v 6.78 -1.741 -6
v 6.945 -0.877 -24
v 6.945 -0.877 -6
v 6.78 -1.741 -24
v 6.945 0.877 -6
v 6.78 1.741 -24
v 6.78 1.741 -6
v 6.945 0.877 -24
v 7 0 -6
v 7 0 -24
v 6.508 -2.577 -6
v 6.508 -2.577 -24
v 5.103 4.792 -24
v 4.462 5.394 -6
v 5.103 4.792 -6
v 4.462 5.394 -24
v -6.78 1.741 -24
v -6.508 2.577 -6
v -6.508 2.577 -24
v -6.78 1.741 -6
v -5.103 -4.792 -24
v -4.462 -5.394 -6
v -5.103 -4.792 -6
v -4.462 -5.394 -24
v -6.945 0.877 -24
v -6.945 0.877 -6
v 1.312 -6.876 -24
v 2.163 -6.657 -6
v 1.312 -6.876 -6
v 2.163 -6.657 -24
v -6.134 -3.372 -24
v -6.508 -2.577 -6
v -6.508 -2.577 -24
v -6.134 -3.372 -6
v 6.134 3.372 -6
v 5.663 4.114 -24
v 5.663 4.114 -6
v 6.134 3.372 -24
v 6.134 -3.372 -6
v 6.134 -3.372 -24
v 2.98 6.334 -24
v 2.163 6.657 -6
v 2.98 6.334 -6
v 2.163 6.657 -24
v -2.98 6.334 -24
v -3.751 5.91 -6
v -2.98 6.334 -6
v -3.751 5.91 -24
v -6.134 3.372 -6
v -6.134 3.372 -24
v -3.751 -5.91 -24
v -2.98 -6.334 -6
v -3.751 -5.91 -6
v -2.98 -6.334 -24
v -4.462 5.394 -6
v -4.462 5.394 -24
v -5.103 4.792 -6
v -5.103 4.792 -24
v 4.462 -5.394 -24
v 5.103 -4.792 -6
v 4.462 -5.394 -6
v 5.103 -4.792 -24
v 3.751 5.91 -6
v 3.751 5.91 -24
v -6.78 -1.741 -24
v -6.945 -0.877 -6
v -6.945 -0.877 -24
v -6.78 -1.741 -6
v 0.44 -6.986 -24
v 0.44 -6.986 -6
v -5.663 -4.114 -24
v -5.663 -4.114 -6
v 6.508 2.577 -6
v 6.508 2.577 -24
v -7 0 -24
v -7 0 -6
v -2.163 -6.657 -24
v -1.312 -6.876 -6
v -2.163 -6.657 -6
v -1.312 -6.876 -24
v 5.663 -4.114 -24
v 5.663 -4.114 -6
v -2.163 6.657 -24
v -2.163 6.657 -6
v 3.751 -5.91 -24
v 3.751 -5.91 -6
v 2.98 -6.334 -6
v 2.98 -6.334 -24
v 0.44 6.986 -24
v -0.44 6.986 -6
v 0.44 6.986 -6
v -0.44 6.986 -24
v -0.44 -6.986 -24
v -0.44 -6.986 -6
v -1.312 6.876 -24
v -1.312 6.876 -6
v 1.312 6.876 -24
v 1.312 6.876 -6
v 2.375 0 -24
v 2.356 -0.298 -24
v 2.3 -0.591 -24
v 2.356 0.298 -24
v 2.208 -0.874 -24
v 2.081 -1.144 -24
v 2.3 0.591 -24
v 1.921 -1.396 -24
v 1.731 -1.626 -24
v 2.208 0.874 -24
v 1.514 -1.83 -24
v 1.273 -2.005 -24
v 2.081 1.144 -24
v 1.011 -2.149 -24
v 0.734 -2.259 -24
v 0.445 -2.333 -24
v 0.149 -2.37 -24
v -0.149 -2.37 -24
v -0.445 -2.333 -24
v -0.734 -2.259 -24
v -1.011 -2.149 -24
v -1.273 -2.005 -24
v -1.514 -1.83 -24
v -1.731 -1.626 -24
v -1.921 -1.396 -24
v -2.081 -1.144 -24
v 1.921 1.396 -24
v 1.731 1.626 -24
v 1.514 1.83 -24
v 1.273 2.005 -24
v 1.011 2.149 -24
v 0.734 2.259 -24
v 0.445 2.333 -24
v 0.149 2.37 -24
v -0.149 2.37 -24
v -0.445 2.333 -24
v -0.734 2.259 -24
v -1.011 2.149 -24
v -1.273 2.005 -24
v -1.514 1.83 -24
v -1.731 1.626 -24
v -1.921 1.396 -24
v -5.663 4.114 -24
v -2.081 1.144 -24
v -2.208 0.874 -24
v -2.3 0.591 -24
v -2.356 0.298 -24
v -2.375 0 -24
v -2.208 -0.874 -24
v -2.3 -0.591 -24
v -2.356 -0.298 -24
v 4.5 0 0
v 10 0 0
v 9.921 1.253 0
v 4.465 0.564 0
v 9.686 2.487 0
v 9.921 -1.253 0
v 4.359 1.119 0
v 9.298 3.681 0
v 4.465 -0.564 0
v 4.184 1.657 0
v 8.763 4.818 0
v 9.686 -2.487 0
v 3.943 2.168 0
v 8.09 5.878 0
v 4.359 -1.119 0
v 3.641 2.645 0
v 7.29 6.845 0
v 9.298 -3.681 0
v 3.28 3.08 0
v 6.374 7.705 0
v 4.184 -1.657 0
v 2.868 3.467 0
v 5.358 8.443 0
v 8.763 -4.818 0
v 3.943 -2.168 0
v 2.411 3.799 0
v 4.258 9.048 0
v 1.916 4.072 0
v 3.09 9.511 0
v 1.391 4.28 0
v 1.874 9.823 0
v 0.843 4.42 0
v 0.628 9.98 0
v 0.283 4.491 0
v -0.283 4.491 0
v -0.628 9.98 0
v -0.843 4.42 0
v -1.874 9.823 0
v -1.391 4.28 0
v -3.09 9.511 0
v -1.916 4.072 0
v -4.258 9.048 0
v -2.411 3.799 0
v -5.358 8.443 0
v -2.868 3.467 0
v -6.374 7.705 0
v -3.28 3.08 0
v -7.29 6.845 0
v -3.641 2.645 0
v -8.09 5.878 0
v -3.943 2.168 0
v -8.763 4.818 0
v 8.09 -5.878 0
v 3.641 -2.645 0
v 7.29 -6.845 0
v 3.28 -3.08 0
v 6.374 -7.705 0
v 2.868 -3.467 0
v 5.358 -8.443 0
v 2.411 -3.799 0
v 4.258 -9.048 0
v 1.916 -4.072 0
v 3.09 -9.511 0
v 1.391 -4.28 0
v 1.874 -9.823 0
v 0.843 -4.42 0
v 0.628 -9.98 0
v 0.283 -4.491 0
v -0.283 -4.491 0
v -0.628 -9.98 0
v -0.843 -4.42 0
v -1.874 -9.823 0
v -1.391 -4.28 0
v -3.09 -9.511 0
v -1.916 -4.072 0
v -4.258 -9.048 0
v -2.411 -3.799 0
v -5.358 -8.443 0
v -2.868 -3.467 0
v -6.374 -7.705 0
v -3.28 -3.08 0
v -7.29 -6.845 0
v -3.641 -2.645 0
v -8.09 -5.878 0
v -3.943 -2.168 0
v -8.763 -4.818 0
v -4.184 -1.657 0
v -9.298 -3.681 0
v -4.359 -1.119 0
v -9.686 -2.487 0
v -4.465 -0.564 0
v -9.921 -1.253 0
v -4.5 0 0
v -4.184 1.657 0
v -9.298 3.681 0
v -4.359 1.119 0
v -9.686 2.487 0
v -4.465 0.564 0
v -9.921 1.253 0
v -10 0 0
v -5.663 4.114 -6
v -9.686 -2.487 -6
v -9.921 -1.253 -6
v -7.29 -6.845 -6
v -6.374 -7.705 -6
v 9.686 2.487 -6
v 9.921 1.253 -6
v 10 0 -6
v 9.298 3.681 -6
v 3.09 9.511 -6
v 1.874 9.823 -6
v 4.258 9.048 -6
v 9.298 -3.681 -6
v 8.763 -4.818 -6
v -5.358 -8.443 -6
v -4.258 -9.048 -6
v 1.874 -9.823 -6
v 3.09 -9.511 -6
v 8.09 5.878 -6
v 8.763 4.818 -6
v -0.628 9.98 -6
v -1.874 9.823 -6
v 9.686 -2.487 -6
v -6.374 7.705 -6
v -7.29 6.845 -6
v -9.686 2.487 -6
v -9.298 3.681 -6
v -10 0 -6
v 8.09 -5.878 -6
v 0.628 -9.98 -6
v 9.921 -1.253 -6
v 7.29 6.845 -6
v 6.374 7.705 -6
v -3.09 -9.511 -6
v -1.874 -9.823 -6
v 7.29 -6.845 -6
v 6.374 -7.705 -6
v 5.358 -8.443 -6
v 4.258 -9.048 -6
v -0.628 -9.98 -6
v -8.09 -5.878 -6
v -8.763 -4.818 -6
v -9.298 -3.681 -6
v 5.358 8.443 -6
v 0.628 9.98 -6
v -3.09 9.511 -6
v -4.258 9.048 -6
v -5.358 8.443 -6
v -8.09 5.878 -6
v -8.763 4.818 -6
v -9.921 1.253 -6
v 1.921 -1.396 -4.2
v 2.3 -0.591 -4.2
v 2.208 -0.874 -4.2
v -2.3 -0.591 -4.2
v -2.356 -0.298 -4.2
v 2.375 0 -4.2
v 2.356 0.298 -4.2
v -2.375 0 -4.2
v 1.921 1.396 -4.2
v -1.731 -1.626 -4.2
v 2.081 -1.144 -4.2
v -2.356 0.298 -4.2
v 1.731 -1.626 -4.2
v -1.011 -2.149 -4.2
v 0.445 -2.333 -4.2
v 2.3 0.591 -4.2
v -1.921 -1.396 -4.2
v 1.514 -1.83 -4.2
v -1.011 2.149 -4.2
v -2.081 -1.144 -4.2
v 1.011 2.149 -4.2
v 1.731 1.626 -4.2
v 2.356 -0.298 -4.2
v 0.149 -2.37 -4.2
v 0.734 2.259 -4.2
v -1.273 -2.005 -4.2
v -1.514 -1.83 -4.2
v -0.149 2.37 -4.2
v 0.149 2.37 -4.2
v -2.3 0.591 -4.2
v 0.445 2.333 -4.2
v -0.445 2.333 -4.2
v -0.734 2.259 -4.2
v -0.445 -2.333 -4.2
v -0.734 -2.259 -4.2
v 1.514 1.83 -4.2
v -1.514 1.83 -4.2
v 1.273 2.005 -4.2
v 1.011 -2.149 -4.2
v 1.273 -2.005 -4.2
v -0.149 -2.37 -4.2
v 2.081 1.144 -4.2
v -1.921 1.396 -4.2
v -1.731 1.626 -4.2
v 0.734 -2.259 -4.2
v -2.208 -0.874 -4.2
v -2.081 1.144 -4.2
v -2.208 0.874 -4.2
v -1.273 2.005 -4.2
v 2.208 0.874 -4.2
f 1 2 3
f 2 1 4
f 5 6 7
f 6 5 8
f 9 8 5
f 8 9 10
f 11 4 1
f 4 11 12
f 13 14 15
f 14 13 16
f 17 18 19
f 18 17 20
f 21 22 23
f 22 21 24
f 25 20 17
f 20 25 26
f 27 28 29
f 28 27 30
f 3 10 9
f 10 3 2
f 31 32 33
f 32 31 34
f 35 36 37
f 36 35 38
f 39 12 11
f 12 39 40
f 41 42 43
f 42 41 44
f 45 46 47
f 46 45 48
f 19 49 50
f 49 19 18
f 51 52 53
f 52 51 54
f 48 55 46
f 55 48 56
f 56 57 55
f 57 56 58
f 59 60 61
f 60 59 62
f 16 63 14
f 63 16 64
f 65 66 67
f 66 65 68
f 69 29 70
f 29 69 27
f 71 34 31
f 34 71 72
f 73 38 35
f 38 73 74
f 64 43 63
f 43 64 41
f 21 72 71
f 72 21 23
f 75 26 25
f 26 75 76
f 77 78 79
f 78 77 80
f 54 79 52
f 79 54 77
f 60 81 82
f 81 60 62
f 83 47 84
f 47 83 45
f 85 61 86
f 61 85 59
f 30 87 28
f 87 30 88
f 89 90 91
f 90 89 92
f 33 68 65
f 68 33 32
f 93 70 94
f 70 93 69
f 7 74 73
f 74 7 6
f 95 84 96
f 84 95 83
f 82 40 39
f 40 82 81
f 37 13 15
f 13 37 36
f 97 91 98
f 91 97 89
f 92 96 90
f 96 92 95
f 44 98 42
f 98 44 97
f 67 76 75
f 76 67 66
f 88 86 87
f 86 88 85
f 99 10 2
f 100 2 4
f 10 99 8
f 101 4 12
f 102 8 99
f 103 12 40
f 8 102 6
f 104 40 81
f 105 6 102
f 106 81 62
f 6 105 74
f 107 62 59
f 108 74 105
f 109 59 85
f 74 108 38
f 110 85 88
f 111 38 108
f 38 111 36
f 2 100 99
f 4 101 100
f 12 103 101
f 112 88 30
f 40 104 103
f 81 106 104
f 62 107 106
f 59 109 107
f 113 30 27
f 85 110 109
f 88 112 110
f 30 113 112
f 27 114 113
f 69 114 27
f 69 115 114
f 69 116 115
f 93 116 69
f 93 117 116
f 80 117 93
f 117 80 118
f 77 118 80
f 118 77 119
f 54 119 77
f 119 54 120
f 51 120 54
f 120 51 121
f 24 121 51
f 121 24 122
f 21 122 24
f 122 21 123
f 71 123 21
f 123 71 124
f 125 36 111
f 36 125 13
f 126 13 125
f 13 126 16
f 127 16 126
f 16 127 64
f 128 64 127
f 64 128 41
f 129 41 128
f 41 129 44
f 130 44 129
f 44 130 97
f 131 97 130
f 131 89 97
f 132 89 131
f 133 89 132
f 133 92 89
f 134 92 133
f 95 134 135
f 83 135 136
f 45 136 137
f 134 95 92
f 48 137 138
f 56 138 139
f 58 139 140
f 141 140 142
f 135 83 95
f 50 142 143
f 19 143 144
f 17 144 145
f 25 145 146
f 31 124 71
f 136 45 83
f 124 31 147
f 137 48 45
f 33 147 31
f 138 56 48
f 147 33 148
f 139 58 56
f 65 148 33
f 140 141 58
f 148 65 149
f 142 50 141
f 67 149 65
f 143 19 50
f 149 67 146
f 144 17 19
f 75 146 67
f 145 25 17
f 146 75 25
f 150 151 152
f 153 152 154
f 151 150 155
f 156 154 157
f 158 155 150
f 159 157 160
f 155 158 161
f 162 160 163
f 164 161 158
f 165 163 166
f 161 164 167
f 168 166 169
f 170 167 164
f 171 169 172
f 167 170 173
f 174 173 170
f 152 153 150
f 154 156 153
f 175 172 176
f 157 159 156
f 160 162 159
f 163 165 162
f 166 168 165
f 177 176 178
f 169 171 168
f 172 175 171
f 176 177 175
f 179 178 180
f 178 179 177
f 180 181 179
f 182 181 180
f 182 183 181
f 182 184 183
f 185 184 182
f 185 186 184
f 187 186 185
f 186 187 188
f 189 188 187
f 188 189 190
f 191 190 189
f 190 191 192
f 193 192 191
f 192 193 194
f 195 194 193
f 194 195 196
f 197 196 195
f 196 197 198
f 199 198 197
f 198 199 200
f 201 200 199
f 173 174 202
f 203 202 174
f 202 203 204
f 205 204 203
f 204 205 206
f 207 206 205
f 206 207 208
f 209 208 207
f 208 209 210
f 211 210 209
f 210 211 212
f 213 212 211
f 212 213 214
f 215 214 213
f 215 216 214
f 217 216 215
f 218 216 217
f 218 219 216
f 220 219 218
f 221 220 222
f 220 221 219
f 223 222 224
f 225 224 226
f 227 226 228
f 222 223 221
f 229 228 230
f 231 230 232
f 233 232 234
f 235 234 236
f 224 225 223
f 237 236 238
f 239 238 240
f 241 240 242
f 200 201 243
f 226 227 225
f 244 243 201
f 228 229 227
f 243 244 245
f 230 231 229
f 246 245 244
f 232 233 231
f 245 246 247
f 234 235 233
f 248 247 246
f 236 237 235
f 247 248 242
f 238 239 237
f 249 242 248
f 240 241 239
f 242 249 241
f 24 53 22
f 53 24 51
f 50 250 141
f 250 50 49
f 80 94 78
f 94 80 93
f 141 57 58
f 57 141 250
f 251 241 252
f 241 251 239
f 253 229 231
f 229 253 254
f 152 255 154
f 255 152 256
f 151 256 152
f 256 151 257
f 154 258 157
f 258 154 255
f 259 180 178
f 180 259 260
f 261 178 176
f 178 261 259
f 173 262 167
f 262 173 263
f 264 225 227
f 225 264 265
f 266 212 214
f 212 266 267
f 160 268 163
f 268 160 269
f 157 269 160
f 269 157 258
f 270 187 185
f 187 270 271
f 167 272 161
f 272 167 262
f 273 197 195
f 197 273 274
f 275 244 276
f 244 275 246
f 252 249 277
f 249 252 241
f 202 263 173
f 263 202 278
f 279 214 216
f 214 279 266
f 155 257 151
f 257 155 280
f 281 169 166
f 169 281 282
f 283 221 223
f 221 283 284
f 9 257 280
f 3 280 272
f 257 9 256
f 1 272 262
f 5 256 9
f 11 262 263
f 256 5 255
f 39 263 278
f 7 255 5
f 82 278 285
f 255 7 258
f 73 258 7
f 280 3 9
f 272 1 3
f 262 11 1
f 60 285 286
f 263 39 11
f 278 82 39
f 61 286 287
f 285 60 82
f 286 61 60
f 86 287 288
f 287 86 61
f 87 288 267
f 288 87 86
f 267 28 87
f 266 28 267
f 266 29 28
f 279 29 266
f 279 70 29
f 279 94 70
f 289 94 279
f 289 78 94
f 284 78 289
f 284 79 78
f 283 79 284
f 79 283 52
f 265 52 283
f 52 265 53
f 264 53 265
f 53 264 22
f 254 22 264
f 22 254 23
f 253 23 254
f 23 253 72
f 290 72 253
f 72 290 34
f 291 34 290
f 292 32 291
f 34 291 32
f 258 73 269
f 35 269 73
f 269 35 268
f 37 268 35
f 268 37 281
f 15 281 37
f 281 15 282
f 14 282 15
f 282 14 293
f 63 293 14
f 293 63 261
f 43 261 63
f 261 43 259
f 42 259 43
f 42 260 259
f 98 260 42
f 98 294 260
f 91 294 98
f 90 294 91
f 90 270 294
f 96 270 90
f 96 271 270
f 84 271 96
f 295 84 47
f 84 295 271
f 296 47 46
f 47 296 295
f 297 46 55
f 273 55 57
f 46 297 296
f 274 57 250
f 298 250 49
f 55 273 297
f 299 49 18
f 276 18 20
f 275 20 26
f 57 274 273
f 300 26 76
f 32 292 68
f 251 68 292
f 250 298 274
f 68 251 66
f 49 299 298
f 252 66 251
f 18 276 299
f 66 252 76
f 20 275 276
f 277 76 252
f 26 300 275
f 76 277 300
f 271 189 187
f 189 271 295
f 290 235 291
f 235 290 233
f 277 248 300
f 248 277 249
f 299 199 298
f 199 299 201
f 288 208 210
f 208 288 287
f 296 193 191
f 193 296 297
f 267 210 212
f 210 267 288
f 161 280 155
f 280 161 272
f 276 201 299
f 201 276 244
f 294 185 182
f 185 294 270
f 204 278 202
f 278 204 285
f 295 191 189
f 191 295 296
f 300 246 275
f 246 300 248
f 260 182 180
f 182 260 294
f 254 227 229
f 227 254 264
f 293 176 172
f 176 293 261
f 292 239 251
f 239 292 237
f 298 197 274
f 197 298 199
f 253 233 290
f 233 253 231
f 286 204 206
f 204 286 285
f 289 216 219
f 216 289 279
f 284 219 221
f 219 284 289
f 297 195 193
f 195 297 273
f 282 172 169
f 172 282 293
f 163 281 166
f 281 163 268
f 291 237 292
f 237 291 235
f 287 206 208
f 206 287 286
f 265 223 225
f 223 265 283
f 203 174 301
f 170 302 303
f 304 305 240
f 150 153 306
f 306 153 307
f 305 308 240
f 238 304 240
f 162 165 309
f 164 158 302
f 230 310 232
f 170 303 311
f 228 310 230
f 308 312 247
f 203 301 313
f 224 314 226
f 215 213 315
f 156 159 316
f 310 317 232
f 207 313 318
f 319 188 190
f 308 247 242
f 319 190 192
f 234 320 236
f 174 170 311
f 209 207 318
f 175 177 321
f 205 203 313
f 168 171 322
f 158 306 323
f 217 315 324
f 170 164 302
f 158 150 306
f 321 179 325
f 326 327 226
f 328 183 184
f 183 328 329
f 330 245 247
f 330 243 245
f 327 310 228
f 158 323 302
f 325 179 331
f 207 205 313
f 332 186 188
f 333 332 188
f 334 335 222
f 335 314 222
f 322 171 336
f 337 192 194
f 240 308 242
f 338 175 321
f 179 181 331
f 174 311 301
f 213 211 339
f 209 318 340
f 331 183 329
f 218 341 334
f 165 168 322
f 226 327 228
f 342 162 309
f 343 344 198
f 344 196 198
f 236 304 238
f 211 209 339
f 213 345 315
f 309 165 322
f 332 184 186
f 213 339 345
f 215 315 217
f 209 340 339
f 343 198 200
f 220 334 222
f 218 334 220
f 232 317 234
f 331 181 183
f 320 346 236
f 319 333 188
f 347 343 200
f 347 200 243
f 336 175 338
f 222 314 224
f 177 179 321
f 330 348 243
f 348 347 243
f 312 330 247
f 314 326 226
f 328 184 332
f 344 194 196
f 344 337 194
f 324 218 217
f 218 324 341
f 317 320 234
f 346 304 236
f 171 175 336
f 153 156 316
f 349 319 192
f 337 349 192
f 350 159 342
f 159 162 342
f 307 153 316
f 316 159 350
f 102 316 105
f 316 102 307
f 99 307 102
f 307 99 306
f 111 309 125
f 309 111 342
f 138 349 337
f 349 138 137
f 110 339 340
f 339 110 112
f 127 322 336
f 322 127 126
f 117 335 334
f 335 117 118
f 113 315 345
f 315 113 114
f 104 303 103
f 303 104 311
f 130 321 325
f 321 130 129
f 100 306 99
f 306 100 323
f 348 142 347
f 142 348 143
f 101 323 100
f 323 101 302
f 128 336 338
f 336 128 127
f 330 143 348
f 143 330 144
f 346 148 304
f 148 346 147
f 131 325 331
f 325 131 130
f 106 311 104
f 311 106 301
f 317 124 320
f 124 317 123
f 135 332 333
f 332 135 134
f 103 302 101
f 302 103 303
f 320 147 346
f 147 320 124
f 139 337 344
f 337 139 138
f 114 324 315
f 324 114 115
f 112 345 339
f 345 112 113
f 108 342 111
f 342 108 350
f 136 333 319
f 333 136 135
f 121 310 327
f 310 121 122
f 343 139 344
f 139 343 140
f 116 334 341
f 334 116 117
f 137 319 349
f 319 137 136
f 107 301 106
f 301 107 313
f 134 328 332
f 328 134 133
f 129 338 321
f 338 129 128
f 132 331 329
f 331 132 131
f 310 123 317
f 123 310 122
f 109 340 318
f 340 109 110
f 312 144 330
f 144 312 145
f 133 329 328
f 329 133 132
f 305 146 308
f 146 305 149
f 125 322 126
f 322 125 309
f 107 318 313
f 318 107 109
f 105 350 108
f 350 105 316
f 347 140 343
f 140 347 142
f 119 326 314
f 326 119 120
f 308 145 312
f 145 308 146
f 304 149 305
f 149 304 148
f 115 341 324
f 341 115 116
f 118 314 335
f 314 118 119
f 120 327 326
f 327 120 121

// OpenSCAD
$fn = 50;


difference() {
	union() {
		translate(v = [0, 0, -24.0000000000]) {
			cylinder(h = 24, r = 7.0000000000);
		}
		translate(v = [0, 0, -6.0000000000]) {
			cylinder(h = 6, r = 10.0000000000);
		}
	}
	union() {
		translate(v = [0, 0, 0]) {
			rotate(a = [0, 0, 0]) {
				difference() {
					union() {
						#translate(v = [0, 0, -24.0000000000]) {
							cylinder(h = 24, r = 2.2500000000);
						}
						#translate(v = [0, 0, -4.2000000000]) {
							cylinder(h = 4.2000000000, r = 7.0000000000, r1 = 2.3750000000, r2 = 4.5000000000);
						}
						#translate(v = [0, 0, -24.0000000000]) {
							cylinder(h = 24, r = 2.3750000000);
						}
						#translate(v = [0, 0, -24.0000000000]) {
							cylinder(h = 24, r = 2.2500000000);
						}
					}
					union();
				}
			}
		}
	}
}
